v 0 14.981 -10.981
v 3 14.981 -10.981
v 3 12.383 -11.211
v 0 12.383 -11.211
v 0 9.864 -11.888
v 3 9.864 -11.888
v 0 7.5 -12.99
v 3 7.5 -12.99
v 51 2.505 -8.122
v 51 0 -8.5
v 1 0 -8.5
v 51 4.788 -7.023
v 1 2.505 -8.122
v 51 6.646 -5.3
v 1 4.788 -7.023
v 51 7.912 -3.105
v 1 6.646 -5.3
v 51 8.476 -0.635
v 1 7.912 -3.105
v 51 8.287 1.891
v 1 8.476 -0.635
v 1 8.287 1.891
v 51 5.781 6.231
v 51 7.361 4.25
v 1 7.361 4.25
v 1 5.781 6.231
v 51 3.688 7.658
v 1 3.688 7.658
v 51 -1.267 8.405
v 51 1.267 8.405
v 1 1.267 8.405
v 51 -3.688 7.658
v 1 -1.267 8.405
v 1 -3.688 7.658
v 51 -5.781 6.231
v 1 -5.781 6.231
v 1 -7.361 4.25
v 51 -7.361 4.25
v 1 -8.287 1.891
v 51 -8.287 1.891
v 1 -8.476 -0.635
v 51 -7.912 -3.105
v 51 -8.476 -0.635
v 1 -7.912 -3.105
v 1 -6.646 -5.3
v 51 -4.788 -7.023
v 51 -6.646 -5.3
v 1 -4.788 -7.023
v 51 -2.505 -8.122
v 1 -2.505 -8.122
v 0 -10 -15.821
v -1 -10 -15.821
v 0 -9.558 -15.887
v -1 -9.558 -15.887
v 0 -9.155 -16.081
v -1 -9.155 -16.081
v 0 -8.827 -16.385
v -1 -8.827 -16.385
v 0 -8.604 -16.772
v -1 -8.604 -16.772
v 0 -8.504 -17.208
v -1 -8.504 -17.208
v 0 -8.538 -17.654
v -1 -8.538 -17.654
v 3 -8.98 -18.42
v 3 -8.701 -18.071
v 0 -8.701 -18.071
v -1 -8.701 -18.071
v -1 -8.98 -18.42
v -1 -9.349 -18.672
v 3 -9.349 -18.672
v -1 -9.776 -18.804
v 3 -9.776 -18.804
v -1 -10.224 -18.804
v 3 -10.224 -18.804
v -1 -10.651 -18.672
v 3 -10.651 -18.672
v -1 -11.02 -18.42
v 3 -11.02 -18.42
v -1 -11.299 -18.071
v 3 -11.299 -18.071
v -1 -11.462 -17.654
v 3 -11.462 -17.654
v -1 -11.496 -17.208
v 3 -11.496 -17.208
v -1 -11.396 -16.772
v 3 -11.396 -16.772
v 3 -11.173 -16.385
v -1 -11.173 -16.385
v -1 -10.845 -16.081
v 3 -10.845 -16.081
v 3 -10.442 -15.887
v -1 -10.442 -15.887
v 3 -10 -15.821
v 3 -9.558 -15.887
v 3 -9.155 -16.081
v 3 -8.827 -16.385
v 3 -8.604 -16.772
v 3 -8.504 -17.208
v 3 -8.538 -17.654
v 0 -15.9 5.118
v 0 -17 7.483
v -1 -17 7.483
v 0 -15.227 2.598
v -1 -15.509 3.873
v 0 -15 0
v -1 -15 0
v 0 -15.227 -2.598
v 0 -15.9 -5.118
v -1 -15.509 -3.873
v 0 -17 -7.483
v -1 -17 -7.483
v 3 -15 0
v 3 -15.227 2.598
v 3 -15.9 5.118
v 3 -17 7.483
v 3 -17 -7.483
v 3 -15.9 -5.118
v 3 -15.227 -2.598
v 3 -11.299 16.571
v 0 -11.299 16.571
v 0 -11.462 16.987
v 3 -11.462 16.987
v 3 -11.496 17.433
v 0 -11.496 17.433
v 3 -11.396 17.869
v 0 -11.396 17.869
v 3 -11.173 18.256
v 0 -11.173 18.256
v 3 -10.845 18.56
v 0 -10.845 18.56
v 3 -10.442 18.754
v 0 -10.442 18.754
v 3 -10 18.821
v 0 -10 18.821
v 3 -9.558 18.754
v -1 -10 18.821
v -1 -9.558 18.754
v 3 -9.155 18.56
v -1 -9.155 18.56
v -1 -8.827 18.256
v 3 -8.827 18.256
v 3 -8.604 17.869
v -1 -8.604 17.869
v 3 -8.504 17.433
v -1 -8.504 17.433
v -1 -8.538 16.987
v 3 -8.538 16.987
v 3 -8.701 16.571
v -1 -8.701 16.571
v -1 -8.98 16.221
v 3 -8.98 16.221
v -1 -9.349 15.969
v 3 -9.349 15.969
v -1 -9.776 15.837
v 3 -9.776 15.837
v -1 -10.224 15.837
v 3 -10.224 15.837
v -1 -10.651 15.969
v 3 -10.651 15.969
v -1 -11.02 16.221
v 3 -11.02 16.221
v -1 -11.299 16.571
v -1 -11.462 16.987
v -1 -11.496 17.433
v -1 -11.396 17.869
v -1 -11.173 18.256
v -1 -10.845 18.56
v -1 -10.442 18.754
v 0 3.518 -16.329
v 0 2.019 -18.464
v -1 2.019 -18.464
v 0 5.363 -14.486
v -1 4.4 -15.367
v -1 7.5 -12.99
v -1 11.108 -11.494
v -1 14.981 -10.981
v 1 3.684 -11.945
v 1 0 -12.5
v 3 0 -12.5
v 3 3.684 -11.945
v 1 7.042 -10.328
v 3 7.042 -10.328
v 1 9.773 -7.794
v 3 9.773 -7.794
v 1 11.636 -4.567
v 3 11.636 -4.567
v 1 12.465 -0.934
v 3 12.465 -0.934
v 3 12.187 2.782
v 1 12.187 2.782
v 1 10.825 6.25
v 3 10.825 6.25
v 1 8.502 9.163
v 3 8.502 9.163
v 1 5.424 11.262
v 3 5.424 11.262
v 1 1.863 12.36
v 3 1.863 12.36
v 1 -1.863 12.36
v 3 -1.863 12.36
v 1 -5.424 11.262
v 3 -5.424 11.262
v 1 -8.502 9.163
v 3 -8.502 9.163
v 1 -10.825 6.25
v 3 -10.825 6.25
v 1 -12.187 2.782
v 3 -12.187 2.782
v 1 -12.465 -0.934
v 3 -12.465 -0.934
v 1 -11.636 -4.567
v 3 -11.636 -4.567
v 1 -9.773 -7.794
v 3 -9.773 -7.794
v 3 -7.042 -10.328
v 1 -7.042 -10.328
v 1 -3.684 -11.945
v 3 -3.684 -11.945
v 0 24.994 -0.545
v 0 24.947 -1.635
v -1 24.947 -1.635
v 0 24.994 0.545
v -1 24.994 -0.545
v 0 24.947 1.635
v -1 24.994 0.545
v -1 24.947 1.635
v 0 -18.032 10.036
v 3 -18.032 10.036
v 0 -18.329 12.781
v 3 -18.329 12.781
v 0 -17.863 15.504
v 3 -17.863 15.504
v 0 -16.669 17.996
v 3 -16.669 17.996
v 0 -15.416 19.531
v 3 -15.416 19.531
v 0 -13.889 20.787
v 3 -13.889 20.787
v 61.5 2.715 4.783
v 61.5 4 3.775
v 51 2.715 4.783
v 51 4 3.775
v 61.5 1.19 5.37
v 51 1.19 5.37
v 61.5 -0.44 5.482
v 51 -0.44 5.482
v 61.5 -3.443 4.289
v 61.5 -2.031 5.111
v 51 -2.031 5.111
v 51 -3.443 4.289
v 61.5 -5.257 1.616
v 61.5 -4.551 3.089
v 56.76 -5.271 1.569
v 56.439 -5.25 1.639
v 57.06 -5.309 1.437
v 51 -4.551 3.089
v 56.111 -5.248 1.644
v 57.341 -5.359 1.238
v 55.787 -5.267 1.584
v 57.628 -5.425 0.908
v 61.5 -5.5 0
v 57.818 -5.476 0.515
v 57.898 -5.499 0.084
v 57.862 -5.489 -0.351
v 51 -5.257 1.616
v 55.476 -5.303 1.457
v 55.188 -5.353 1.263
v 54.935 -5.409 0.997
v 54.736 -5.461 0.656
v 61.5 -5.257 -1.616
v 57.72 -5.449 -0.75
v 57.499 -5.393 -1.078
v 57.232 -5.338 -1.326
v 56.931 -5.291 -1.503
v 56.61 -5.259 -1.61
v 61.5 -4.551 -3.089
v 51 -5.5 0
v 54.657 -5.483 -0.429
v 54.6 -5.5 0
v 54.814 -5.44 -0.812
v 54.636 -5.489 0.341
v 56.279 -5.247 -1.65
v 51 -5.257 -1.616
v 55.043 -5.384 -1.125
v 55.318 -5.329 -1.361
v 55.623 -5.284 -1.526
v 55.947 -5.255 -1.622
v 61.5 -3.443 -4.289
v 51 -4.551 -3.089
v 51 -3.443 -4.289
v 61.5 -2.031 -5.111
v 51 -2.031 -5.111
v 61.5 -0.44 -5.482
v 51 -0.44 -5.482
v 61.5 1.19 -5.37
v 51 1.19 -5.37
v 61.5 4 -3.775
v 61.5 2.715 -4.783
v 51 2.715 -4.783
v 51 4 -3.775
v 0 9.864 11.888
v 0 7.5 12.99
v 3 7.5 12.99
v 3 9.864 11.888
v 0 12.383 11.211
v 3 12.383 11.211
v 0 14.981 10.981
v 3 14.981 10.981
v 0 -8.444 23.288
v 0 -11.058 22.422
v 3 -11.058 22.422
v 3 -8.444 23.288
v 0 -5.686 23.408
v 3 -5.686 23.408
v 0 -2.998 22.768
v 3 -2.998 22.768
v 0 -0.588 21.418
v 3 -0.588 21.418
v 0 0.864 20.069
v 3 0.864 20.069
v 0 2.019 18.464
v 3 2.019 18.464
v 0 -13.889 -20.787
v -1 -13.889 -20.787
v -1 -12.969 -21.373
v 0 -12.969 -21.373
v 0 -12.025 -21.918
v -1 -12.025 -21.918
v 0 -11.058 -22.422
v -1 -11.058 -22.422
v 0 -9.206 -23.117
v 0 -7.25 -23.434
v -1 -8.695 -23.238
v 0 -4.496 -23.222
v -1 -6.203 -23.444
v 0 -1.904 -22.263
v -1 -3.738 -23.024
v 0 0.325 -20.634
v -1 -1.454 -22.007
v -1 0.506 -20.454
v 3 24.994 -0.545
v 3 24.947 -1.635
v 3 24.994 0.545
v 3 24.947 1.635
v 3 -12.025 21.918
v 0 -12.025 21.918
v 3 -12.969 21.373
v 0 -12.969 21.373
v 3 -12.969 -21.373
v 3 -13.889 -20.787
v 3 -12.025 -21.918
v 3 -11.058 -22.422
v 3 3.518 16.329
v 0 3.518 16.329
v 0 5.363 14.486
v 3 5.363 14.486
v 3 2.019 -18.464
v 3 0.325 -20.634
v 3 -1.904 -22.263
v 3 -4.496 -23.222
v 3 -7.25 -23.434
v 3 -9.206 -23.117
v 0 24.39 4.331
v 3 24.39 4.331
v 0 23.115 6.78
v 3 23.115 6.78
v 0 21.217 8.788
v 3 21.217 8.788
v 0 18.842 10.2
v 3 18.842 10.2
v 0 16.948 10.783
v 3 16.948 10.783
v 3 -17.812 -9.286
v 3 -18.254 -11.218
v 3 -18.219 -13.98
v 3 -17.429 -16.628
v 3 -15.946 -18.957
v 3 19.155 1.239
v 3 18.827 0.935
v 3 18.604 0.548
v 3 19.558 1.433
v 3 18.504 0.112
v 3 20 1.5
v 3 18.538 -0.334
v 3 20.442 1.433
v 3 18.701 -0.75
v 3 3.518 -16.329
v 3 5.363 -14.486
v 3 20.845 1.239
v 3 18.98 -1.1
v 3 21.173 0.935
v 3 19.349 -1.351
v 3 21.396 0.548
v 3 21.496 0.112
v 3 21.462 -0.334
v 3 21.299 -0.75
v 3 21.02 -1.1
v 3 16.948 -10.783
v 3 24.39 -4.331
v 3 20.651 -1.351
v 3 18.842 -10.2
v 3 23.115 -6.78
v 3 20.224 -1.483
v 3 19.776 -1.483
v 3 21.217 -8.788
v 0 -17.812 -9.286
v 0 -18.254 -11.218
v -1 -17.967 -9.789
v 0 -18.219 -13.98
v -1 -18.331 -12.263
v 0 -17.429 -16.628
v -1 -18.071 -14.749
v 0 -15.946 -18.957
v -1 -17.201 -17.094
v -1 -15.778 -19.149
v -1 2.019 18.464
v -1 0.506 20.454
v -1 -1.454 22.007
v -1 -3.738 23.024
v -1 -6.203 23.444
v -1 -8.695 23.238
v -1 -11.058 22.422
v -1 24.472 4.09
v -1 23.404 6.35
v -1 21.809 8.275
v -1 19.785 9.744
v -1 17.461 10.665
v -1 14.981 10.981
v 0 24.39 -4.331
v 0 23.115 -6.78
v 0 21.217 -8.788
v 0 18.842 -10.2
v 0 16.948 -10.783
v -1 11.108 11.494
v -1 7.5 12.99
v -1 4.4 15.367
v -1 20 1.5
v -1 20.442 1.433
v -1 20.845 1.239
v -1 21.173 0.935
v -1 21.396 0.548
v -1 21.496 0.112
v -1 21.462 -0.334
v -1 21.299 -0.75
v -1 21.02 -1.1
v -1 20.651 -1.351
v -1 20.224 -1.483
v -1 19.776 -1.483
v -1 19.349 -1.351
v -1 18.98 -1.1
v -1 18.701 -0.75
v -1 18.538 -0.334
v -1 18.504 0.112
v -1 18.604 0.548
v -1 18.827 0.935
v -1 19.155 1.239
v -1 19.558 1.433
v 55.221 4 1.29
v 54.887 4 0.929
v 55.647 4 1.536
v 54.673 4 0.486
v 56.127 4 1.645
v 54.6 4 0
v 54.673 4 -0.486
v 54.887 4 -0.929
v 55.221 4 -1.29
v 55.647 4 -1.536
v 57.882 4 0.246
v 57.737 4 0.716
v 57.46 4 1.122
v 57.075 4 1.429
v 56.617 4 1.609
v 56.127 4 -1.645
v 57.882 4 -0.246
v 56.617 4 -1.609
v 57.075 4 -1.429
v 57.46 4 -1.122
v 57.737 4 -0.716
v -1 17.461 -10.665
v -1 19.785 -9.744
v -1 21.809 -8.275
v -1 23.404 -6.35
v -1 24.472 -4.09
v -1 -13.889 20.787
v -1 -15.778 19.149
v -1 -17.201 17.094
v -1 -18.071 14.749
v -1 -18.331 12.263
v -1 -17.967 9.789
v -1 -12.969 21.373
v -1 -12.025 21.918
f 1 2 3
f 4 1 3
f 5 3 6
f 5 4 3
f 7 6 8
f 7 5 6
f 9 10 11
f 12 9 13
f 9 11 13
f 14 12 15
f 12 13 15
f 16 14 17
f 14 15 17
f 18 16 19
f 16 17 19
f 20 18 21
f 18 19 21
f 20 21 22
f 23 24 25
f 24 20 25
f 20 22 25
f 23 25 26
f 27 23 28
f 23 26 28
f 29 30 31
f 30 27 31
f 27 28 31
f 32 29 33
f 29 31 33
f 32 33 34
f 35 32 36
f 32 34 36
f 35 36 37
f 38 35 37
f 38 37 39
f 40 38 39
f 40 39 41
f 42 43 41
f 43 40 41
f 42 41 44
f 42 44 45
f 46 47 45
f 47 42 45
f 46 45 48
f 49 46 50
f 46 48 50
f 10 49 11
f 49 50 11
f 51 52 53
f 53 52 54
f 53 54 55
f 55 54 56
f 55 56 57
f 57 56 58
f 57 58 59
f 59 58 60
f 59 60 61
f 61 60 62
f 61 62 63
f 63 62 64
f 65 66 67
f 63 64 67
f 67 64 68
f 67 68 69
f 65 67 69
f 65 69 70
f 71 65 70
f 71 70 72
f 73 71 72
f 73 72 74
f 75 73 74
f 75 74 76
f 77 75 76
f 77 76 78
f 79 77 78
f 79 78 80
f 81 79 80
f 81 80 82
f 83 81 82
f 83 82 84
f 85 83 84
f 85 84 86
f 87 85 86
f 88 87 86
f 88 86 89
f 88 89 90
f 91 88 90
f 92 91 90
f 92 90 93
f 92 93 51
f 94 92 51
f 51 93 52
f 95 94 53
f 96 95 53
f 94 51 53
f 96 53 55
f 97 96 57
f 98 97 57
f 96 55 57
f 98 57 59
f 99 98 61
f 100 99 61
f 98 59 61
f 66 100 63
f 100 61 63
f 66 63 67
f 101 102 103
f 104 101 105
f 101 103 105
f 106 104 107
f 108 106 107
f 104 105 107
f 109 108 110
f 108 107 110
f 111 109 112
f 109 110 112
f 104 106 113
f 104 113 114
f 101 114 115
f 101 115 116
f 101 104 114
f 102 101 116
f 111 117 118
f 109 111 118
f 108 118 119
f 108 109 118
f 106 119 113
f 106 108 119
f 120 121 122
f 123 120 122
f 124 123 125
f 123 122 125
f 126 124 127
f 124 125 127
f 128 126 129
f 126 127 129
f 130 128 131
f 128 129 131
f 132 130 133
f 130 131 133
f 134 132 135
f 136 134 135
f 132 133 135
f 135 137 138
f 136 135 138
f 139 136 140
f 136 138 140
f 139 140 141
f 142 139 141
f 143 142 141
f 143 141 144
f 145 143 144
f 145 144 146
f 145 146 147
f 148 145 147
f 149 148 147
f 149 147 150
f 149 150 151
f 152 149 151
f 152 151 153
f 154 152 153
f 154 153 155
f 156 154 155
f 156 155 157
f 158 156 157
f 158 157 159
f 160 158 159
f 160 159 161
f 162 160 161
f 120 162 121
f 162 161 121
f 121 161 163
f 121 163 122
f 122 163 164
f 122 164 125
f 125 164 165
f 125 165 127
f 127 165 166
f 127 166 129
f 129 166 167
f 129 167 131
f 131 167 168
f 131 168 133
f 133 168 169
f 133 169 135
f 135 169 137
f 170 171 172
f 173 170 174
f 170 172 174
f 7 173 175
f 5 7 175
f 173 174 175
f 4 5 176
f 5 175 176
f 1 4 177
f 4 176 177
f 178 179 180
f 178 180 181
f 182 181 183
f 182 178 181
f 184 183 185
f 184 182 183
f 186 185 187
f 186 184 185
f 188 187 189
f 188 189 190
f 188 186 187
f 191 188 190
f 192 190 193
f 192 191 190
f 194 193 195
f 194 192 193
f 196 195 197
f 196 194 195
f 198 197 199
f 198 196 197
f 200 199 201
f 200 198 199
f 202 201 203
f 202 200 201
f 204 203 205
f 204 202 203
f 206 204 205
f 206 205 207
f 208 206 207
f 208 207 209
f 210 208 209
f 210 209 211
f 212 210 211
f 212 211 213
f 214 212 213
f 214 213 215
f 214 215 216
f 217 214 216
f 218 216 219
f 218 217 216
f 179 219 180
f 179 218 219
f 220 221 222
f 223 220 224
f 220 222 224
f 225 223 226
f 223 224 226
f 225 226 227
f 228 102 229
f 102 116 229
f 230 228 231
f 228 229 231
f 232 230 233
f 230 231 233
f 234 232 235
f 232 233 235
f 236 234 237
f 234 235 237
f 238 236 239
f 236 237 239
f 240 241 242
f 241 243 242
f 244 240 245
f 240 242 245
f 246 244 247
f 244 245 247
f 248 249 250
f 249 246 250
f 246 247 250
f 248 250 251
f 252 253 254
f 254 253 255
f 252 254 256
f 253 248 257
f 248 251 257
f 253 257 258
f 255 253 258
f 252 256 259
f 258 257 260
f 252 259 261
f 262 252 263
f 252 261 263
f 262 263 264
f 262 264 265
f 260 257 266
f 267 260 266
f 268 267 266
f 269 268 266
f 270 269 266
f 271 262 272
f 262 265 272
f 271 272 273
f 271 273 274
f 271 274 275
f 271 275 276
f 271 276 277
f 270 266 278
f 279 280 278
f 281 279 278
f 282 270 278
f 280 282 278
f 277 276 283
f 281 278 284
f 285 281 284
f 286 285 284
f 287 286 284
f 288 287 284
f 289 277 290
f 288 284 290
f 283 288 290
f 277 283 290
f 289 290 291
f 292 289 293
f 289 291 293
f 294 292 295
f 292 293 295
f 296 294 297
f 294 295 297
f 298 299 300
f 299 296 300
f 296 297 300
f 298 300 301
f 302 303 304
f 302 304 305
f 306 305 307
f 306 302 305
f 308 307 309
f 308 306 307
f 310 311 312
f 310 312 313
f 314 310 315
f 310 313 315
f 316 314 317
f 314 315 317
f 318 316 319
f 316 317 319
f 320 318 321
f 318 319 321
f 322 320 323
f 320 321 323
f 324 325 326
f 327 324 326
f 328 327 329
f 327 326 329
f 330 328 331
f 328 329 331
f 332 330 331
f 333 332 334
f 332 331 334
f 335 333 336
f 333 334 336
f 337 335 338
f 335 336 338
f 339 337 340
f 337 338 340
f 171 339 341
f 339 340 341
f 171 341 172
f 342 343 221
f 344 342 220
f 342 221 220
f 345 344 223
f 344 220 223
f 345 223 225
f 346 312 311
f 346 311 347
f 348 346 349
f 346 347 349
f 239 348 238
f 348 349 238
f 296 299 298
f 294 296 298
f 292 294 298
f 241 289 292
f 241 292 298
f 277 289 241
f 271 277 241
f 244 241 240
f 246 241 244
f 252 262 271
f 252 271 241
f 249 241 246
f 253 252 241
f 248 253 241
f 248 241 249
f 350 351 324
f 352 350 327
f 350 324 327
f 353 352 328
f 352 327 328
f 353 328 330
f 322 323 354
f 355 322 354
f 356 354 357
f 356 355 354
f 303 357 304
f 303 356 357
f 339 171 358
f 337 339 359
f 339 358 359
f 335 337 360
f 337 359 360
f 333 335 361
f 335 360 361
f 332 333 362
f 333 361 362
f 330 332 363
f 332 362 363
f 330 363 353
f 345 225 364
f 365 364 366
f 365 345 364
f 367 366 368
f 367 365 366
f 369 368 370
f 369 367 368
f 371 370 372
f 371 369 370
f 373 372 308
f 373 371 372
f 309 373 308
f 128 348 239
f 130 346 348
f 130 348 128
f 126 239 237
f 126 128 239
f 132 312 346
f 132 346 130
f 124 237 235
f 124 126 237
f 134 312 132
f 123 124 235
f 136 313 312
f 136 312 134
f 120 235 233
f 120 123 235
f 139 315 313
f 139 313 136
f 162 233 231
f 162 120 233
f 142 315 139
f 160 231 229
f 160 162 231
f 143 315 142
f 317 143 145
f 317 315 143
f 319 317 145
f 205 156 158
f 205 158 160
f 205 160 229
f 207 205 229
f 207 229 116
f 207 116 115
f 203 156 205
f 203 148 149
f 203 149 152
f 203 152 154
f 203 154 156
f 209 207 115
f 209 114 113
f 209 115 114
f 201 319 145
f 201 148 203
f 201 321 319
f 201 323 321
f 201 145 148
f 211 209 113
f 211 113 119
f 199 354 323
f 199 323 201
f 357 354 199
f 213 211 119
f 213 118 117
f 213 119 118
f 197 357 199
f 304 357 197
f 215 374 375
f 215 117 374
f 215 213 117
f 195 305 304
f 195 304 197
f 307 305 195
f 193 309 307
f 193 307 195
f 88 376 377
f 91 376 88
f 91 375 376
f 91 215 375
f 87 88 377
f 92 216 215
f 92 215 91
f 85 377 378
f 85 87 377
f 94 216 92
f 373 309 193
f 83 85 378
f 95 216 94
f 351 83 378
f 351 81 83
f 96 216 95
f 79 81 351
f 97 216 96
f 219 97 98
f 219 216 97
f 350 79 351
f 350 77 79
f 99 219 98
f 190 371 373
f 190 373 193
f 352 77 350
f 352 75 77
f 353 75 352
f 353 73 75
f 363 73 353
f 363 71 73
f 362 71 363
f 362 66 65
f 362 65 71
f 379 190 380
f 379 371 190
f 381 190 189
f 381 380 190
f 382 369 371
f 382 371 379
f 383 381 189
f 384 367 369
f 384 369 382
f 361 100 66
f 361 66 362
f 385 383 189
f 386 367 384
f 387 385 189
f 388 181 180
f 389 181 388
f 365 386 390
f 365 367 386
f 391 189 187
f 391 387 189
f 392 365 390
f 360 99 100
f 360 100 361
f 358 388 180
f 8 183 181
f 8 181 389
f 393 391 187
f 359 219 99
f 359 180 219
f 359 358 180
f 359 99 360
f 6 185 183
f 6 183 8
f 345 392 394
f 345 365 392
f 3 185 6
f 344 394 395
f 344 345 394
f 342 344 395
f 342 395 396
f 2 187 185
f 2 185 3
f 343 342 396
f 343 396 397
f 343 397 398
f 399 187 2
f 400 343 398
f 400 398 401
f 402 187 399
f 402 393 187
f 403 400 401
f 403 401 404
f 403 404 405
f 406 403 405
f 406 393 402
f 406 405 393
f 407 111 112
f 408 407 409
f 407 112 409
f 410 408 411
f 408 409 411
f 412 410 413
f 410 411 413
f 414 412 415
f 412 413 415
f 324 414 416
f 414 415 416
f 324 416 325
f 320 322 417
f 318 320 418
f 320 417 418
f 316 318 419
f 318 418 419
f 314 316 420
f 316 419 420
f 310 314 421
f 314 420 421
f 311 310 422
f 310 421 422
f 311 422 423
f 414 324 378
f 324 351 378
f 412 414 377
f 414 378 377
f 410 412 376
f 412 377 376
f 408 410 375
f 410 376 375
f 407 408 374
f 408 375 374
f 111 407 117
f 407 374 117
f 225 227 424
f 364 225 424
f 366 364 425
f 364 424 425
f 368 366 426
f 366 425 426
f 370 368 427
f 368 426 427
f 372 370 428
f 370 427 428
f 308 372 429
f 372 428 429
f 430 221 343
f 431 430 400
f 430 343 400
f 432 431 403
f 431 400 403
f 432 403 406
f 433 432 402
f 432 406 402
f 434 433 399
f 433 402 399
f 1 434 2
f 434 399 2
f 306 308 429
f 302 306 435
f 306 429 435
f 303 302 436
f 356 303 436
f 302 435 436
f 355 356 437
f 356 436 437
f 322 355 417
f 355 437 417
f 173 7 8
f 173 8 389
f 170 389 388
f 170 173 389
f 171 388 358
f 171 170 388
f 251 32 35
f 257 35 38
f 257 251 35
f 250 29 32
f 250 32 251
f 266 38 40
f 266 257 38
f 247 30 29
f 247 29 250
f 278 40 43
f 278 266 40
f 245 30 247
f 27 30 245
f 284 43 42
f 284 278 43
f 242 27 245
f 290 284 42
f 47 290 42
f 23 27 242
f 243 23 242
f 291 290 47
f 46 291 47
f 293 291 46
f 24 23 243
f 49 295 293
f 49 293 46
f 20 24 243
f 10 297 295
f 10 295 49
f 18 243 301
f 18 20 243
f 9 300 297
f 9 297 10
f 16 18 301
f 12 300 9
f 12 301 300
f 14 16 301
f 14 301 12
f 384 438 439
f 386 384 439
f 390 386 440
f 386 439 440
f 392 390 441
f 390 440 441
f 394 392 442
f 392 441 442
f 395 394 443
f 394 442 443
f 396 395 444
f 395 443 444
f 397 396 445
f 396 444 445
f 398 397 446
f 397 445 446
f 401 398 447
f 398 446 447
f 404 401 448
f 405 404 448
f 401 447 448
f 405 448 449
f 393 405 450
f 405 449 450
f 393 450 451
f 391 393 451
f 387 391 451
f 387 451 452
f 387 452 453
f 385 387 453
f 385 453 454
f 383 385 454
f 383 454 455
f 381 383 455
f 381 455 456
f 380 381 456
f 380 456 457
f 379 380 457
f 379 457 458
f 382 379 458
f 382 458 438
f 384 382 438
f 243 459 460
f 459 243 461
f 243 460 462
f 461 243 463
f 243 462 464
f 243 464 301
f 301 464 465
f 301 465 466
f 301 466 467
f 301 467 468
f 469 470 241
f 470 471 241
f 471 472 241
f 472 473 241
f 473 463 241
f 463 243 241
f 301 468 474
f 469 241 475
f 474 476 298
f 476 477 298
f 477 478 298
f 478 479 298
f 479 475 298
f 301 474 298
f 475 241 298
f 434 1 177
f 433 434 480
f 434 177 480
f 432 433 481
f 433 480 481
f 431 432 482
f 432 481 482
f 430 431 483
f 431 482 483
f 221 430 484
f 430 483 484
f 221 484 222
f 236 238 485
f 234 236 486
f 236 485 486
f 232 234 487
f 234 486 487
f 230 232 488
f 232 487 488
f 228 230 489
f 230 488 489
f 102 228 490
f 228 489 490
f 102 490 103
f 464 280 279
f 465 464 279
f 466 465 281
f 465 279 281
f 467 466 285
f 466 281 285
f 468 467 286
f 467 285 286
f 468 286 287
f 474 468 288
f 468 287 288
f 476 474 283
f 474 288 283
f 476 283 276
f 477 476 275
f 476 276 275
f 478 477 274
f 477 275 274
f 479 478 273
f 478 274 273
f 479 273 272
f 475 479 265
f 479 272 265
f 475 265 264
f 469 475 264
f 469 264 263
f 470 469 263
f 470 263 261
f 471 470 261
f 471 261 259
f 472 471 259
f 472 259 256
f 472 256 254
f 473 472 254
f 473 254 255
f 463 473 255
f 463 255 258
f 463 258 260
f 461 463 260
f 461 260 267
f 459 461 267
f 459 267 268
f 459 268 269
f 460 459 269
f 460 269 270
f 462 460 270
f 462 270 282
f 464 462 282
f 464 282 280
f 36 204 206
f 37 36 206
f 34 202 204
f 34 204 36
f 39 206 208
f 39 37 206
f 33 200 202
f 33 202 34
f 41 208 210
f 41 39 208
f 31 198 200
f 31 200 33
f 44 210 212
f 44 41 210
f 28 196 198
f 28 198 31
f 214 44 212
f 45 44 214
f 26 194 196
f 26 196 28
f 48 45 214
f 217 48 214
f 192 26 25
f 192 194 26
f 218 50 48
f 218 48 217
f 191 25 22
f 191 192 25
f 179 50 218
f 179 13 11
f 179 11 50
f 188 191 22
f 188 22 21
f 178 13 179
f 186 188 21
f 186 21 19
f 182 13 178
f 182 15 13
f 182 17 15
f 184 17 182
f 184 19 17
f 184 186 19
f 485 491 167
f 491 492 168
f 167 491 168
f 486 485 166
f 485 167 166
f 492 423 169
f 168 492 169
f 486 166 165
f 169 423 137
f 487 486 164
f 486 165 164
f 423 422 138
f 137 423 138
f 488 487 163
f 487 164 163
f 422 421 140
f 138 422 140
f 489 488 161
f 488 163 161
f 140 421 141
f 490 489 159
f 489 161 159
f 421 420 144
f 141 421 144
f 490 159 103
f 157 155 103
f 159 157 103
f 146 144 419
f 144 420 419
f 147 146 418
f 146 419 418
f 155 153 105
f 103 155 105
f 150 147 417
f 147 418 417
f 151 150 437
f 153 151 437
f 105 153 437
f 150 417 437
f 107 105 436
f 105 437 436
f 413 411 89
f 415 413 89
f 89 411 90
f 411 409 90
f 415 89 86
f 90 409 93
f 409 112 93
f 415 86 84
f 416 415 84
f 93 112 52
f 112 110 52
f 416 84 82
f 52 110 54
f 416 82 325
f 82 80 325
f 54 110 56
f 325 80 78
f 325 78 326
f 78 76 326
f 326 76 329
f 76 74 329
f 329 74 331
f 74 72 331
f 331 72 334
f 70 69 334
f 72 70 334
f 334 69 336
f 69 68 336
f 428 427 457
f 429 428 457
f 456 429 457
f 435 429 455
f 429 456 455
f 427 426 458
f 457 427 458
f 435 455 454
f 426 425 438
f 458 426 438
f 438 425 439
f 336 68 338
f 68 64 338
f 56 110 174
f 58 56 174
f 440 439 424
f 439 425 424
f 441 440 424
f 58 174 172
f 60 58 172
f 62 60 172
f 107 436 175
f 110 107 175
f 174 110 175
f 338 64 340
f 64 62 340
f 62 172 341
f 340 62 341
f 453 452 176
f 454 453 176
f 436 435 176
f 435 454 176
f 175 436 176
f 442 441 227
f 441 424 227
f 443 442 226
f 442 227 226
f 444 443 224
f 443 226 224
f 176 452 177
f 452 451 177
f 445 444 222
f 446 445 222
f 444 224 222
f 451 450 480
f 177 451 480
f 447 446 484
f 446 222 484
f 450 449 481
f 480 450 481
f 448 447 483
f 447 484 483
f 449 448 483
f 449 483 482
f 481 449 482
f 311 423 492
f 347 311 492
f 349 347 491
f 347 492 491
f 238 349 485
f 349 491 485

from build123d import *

# Parameters (mm, degrees)
SKETCH_1_R               = 25
EXTRUDE_1_DEPTH          = 3
CUT_EXTRUDE_START        = -3
CUT_EXTRUDE_1_DEPTH      = 3
PATTERN_CIRCULAR_1_COUNT = 3
FILLET_1_R               = 10
SKETCH_3_R               = 8.5
EXTRUDE_2_DEPTH          = 48
SKETCH_5_R               = 1.5
CUT_EXTRUDE_2_DEPTH      = 52
PATTERN_CIRCULAR_2_COUNT = 3
SKETCH_7_R               = 5.5
EXTRUDE_3_DEPTH          = 10.5
SKETCH_8_W               = 10.294353596
SKETCH_8_H               = 3.679030571
CUT_EXTRUDE_3_DEPTH      = 10.5
CUT_EXTRUDE_START_2      = -2
SKETCH_12_R              = 12.5
SKETCH_12_R_2            = 8.5
CUT_EXTRUDE_6_DEPTH      = 2
EXTRUDE_START            = 1
SKETCH_13_R              = 1.5
EXTRUDE_4_DEPTH          = 1
HOLE_WIZARD_M4_1_D       = 3.3


with BuildPart() as part:
    # 草图1 → 凸台-拉伸1 (new body)
    with BuildSketch(Plane(origin=(0, 0, 0), x_dir=(0, 0, -1), z_dir=(1, 0, 0))):
        Circle(SKETCH_1_R)
    extrude(amount=EXTRUDE_1_DEPTH)

    # 草图2 → 切除-拉伸1 (cut)
    with BuildSketch(Plane(origin=(3, 0, 0), x_dir=(0, 0, -1), z_dir=(1, 0, 0)).offset(CUT_EXTRUDE_START)):
        with BuildLine():
            ThreePointArc((24.999979393, 0.032098836), (24.143986785, 6.485977345), (21.650635095, 12.5))
            Line((21.650635095, 12.5), (12.990381057, 7.5))
            ThreePointArc((12.990381057, 7.5), (18.059856782, 2.261897365), (24.999979393, 0.032098836))
        make_face()
        with BuildLine():
            ThreePointArc((12.527788104, 21.634567831), (17.689014542, 17.666317232), (21.650635095, 12.5))
            ThreePointArc((21.650635095, 12.5), (24.143986785, 6.485977345), (24.999979393, 0.032098836))
            ThreePointArc((24.999979393, 0.032098836), (36.234743272, 4.052129412), (40.980762114, 15))
            ThreePointArc((40.980762114, 15), (29.387034993, 29.608124625), (12.527788104, 21.634567831))
        make_face()
        with BuildLine():
            Line((12.990381057, 7.5), (21.650635095, 12.5))
            ThreePointArc((21.650635095, 12.5), (17.689014542, 17.666317232), (12.527788104, 21.634567831))
            ThreePointArc((12.527788104, 21.634567831), (10.98878897, 14.509346079), (12.990381057, 7.5))
        make_face()
    cut_extrude_1 = extrude(amount=CUT_EXTRUDE_1_DEPTH, mode=Mode.SUBTRACT)

    # 阵列(圆周)1: 切除-拉伸1 ×3 about axis
    pattern_circular_1_axis = Axis((0, 0, 0), (1, 0, 0))
    for i in range(1, PATTERN_CIRCULAR_1_COUNT):
        add(cut_extrude_1.rotate(pattern_circular_1_axis, i * 360 / PATTERN_CIRCULAR_1_COUNT), mode=Mode.SUBTRACT)

    # 圆角1
    fillet_1_edges = [part.edges().sort_by_distance(p)[0] for p in [
        (1.5, 0.032098836, 24.999979393),
        (1.5, 21.634567831, 12.527788104),
        (1.5, -21.666666667, -12.472191289),
        (1.5, -21.666666667, 12.472191289),
        (1.5, 21.634567831, -12.527788104),
        (1.5, 0.032098836, -24.999979393),
    ]]
    fillet(fillet_1_edges, radius=FILLET_1_R)

    # 草图3 → 凸台-拉伸2 (add)
    with BuildSketch(Plane(origin=(3, 0, 0), x_dir=(0, 0, -1), z_dir=(1, 0, 0))):
        Circle(SKETCH_3_R)
    extrude(amount=EXTRUDE_2_DEPTH)

    # 草图5 → 切除-拉伸2 (cut)
    with BuildSketch(Plane.ZY):
        with Locations((0, 20)):
            Circle(SKETCH_5_R)
    cut_extrude_2 = extrude(amount=-CUT_EXTRUDE_2_DEPTH, mode=Mode.SUBTRACT)

    # 阵列(圆周)2: 切除-拉伸2 ×3 about axis
    pattern_circular_2_axis = Axis((0, 0, 0), (1, 0, 0))
    for i in range(1, PATTERN_CIRCULAR_2_COUNT):
        add(cut_extrude_2.rotate(pattern_circular_2_axis, i * 360 / PATTERN_CIRCULAR_2_COUNT), mode=Mode.SUBTRACT)

    # 草图7 → 凸台-拉伸3 (add)
    with BuildSketch(Plane(origin=(51, 0, 0), x_dir=(0, 0, -1), z_dir=(1, 0, 0))):
        with Locations(Location((0, 0, 0), (0, 0, 180))):
            Circle(SKETCH_7_R)
    extrude(amount=EXTRUDE_3_DEPTH)

    # 草图8 → 切除-拉伸3 (cut)
    with BuildSketch(Plane(origin=(61.5, 0, 0), x_dir=(0, 0, -1), z_dir=(1, 0, 0))):
        with Locations((0, 5.839515286)):
            Rectangle(SKETCH_8_W, SKETCH_8_H)
    extrude(amount=-CUT_EXTRUDE_3_DEPTH, mode=Mode.SUBTRACT)

    # 草图12 → 切除-拉伸6 (cut)
    with BuildSketch(Plane(origin=(3, 0, 0), x_dir=(0, 0, -1), z_dir=(1, 0, 0)).offset(CUT_EXTRUDE_START_2)):
        Circle(SKETCH_12_R)
        Circle(SKETCH_12_R_2, mode=Mode.SUBTRACT)
    extrude(amount=CUT_EXTRUDE_6_DEPTH, mode=Mode.SUBTRACT)

    # 草图13 → 凸台-拉伸4 (add)
    with BuildSketch(Plane.ZY.offset(EXTRUDE_START)):
        with BuildLine():
            ThreePointArc((-18.464089251, 2.019259302), (-12.990381057, 7.5), (-10.980774478, 14.980740698))
            ThreePointArc((-10.980774478, 14.980740698), (-8.274973062, 21.808572714), (-1.634637867, 24.94650194))
            ThreePointArc((-1.634637867, 24.94650194), (0, 25), (1.634637867, 24.94650194))
            ThreePointArc((1.634637867, 24.94650194), (8.274973062, 21.808572714), (10.980774478, 14.980740698))
            ThreePointArc((10.980774478, 14.980740698), (12.990381057, 7.5), (18.464089251, 2.019259302))
            ThreePointArc((18.464089251, 2.019259302), (23.024264522, -3.737949469), (22.421623349, -11.057613051))
            ThreePointArc((22.421623349, -11.057613051), (21.650635095, -12.5), (20.786985482, -13.888888889))
            ThreePointArc((20.786985482, -13.888888889), (14.749291459, -18.070623245), (7.483314774, -17))
            ThreePointArc((7.483314774, -17), (0, -15), (-7.483314774, -17))
            ThreePointArc((-7.483314774, -17), (-14.749291459, -18.070623245), (-20.786985482, -13.888888889))
            ThreePointArc((-20.786985482, -13.888888889), (-21.650635095, -12.5), (-22.421623349, -11.057613051))
            ThreePointArc((-22.421623349, -11.057613051), (-23.024264522, -3.737949469), (-18.464089251, 2.019259302))
        make_face()
        with Locations((0, 20)):
            Circle(SKETCH_13_R, mode=Mode.SUBTRACT)
        with Locations((-17.320508076, -10)):
            Circle(SKETCH_13_R, mode=Mode.SUBTRACT)
        with Locations((17.320508076, -10)):
            Circle(SKETCH_13_R, mode=Mode.SUBTRACT)
    extrude(amount=-EXTRUDE_4_DEPTH)

    # M4 螺纹孔1 (through all)
    with Locations(Plane(origin=(0, 4, 0), x_dir=(1, 0, 0), z_dir=(0, 1, 0))):
        with Locations((56.25, 0)):
            Hole(HOLE_WIZARD_M4_1_D / 2)


solid = part.part
